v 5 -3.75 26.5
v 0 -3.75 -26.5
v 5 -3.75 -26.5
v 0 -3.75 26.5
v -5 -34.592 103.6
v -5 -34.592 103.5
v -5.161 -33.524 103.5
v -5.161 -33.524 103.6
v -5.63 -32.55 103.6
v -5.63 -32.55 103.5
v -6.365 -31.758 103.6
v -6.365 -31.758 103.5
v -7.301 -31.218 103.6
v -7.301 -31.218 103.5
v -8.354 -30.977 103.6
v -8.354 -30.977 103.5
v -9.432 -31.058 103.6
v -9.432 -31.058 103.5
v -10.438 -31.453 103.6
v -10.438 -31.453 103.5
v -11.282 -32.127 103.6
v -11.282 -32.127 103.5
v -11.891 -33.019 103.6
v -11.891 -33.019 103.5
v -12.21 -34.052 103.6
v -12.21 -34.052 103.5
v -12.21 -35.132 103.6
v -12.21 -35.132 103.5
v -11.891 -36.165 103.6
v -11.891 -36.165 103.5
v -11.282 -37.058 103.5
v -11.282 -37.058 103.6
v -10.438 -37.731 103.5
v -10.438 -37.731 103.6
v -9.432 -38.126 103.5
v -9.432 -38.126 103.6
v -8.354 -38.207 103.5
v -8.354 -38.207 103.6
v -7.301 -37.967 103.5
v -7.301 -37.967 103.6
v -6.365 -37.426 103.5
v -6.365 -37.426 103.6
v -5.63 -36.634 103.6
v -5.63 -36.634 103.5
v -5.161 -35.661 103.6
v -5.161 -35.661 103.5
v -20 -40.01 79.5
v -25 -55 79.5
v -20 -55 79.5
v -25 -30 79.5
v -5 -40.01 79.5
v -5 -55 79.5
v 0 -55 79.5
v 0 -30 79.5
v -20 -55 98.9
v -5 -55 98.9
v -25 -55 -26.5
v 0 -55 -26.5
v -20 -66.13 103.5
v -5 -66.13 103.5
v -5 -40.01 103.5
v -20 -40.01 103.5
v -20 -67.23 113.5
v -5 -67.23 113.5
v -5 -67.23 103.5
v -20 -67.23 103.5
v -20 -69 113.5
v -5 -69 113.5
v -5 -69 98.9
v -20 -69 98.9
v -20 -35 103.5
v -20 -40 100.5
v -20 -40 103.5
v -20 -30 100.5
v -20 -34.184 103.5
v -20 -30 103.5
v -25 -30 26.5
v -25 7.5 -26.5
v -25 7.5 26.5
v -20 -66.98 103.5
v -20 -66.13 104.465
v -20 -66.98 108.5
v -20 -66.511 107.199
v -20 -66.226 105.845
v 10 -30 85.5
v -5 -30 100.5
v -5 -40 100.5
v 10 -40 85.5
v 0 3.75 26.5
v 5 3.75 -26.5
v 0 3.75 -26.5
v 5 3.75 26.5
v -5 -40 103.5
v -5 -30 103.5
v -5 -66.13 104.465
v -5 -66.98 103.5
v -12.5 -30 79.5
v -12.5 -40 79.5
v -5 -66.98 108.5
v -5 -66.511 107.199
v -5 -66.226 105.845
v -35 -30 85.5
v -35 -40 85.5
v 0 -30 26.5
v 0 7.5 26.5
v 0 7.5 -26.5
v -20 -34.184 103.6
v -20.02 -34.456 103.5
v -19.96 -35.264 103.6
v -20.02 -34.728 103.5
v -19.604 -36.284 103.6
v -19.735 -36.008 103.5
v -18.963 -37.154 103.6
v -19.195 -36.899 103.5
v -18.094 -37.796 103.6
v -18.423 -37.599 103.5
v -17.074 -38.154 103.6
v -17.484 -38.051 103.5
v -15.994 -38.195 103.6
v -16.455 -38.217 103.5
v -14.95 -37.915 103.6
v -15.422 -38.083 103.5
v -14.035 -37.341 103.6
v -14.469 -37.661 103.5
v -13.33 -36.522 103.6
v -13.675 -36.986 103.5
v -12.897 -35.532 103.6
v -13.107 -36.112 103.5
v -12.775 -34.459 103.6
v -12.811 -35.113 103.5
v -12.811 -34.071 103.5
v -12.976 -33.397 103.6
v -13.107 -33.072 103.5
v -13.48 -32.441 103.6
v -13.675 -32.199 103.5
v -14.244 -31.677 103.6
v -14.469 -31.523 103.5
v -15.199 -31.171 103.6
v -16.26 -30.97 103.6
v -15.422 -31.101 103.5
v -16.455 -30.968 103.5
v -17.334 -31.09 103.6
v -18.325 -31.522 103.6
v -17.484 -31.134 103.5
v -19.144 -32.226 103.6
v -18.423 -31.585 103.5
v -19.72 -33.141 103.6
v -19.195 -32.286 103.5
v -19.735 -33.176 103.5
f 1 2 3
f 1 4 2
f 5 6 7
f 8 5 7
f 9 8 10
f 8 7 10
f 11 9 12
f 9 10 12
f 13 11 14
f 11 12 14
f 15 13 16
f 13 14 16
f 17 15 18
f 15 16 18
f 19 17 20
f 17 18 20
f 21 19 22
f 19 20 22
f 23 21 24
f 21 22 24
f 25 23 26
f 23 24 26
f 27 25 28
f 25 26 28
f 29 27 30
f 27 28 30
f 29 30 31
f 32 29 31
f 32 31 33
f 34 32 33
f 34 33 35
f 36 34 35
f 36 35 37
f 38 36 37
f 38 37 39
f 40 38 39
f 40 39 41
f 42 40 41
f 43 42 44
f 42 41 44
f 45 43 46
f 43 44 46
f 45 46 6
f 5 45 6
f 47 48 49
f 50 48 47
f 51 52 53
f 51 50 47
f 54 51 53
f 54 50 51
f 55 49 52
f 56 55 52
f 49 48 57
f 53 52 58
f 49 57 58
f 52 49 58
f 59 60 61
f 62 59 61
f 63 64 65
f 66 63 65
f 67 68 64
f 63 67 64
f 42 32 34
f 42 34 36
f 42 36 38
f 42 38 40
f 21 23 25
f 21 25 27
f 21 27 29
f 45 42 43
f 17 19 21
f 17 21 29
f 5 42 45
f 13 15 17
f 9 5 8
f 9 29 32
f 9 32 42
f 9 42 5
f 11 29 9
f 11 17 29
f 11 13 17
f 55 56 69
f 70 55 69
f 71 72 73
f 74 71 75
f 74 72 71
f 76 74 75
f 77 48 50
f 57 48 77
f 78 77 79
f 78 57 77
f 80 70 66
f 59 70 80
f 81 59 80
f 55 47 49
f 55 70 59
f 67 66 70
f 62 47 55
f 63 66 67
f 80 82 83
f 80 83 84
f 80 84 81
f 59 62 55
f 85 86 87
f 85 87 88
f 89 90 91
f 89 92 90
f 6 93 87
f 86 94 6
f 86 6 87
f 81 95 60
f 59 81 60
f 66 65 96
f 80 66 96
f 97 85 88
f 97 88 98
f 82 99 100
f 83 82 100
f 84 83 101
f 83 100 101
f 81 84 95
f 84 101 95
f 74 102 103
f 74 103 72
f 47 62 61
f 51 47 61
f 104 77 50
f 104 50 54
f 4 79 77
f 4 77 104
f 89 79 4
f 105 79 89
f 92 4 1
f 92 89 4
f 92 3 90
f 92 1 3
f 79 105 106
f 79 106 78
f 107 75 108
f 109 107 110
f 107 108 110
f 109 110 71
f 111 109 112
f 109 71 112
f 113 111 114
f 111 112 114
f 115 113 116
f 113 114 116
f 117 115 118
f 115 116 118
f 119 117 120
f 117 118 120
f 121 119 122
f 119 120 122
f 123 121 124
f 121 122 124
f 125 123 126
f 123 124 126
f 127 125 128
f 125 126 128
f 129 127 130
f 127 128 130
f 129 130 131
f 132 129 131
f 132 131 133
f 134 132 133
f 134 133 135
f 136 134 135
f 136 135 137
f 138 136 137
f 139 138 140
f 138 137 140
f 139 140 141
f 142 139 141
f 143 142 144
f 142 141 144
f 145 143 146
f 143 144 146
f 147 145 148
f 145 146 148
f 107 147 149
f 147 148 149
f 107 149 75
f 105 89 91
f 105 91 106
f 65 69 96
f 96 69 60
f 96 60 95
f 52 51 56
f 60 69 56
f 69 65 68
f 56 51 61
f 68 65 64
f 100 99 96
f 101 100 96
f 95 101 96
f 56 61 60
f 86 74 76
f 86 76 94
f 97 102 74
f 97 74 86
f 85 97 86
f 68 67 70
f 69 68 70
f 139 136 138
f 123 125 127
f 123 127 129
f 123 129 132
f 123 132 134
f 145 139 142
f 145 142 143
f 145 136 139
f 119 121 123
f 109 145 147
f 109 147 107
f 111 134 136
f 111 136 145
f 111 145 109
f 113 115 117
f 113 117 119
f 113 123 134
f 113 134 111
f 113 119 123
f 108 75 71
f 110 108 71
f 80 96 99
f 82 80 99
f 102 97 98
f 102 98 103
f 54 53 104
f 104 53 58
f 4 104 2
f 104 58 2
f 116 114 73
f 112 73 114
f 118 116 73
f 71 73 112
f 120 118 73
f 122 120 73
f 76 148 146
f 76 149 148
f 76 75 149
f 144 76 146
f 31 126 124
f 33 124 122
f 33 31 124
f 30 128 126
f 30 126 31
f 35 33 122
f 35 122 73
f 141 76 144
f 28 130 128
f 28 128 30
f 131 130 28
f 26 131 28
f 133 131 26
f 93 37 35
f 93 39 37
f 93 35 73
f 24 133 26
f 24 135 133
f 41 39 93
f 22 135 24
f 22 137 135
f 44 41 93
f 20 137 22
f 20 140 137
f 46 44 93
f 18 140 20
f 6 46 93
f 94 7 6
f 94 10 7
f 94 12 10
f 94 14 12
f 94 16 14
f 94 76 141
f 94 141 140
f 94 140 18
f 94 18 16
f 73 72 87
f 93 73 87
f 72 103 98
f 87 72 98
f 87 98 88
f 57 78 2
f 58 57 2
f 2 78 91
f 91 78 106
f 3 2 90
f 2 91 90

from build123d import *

# Parameters (mm, degrees)
BOSS_EXTRUDE1_DEPTH  = 26.5
SKETCH3_W            = 25
SKETCH3_H            = 25
BOSS_EXTRUDE2_DEPTH  = 53
BOSS_EXTRUDE3_DEPTH  = 10
SKETCH6_W            = 15
SKETCH6_H            = 24
BOSS_EXTRUDE9_DEPTH  = 14.99
BOSS_EXTRUDE10_DEPTH = 15
FILLET1_R            = 10
SKETCH9_R            = 3.625
BOSS_EXTRUDE11_DEPTH = 0.1


with BuildPart() as part:
    # Sketch2 → Boss-Extrude1 (new, symmetric)
    with BuildSketch(Plane.XY):
        Polygon((5, 3.75), (0, 3.75), (0, 7.5), (-25, 7.5), (-25, -55), (0, -55), (0, -3.75), (5, -3.75), align=None)
    extrude(amount=BOSS_EXTRUDE1_DEPTH, both=True)

    # Sketch3 → Boss-Extrude2 (add)
    with BuildSketch(Plane.XY.offset(26.5)):
        with Locations((-12.5, -42.5)):
            Rectangle(SKETCH3_W, SKETCH3_H)
    extrude(amount=BOSS_EXTRUDE2_DEPTH)

    # Sketch6 → Boss-Extrude9 (add)
    with BuildSketch(Plane.XZ.offset(55)):
        with Locations((-12.5, 91.5)):
            Rectangle(SKETCH6_W, SKETCH6_H)
    extrude(amount=-BOSS_EXTRUDE9_DEPTH)

    # Sketch8 → Boss-Extrude10 (add)
    with BuildSketch(Plane(origin=(-5, 0, 0), x_dir=(0, 0, -1), z_dir=(1, 0, 0))):
        Polygon((-103.5, -55), (-98.9, -55), (-98.9, -69), (-103.5, -69), (-113.5, -69), (-113.5, -67.23), (-103.5, -67.23), (-103.5, -66.98), (-108.5, -66.98), (-108.5, -66.13), (-103.5, -66.13), align=None)
    extrude(amount=-BOSS_EXTRUDE10_DEPTH)

    # Fillet1
    # the kernel refuses this fillet: 10 mm, written as the material it takes off along each edge
    with BuildSketch(Plane(origin=(5.086345969, -66.13, 108.5), x_dir=(0, 0, -1), z_dir=(-1, 0, 0))) as fillet1_piece_1:
        with BuildLine():
            CenterArc((4.034538387, 10), FILLET1_R, 246.205727049, 23.794272951)
            Line((0, 0.85), (0, 0))
            Line((0, 0), (4.034538387, 0))
        make_face()
    extrude(amount=35.172691937, mode=Mode.SUBTRACT)


with BuildPart() as body_2:
    # Sketch4 → Boss-Extrude3 (new body)
    with BuildSketch(Plane(origin=(0, -30, 0), x_dir=(1, 0, 0), z_dir=(0, 1, 0))):
        Polygon((-12.5, -79.5), (-35, -85.5), (-20, -100.5), (-20, -103.5), (-5, -103.5), (-5, -100.5), (10, -85.5), align=None)
    extrude(amount=-BOSS_EXTRUDE3_DEPTH)

    # Sketch9 → Boss-Extrude11 (add)
    with BuildSketch(Plane.XY.offset(103.5)):
        with Locations(Location((-16.398016516, -34.592152012, 0), (0, 0, 173.539985727))):
            Circle(SKETCH9_R)
        with Locations((-8.625, -34.592152012)):
            Circle(SKETCH9_R)
    extrude(amount=BOSS_EXTRUDE11_DEPTH)


solid = Compound([part.part, body_2.part])
